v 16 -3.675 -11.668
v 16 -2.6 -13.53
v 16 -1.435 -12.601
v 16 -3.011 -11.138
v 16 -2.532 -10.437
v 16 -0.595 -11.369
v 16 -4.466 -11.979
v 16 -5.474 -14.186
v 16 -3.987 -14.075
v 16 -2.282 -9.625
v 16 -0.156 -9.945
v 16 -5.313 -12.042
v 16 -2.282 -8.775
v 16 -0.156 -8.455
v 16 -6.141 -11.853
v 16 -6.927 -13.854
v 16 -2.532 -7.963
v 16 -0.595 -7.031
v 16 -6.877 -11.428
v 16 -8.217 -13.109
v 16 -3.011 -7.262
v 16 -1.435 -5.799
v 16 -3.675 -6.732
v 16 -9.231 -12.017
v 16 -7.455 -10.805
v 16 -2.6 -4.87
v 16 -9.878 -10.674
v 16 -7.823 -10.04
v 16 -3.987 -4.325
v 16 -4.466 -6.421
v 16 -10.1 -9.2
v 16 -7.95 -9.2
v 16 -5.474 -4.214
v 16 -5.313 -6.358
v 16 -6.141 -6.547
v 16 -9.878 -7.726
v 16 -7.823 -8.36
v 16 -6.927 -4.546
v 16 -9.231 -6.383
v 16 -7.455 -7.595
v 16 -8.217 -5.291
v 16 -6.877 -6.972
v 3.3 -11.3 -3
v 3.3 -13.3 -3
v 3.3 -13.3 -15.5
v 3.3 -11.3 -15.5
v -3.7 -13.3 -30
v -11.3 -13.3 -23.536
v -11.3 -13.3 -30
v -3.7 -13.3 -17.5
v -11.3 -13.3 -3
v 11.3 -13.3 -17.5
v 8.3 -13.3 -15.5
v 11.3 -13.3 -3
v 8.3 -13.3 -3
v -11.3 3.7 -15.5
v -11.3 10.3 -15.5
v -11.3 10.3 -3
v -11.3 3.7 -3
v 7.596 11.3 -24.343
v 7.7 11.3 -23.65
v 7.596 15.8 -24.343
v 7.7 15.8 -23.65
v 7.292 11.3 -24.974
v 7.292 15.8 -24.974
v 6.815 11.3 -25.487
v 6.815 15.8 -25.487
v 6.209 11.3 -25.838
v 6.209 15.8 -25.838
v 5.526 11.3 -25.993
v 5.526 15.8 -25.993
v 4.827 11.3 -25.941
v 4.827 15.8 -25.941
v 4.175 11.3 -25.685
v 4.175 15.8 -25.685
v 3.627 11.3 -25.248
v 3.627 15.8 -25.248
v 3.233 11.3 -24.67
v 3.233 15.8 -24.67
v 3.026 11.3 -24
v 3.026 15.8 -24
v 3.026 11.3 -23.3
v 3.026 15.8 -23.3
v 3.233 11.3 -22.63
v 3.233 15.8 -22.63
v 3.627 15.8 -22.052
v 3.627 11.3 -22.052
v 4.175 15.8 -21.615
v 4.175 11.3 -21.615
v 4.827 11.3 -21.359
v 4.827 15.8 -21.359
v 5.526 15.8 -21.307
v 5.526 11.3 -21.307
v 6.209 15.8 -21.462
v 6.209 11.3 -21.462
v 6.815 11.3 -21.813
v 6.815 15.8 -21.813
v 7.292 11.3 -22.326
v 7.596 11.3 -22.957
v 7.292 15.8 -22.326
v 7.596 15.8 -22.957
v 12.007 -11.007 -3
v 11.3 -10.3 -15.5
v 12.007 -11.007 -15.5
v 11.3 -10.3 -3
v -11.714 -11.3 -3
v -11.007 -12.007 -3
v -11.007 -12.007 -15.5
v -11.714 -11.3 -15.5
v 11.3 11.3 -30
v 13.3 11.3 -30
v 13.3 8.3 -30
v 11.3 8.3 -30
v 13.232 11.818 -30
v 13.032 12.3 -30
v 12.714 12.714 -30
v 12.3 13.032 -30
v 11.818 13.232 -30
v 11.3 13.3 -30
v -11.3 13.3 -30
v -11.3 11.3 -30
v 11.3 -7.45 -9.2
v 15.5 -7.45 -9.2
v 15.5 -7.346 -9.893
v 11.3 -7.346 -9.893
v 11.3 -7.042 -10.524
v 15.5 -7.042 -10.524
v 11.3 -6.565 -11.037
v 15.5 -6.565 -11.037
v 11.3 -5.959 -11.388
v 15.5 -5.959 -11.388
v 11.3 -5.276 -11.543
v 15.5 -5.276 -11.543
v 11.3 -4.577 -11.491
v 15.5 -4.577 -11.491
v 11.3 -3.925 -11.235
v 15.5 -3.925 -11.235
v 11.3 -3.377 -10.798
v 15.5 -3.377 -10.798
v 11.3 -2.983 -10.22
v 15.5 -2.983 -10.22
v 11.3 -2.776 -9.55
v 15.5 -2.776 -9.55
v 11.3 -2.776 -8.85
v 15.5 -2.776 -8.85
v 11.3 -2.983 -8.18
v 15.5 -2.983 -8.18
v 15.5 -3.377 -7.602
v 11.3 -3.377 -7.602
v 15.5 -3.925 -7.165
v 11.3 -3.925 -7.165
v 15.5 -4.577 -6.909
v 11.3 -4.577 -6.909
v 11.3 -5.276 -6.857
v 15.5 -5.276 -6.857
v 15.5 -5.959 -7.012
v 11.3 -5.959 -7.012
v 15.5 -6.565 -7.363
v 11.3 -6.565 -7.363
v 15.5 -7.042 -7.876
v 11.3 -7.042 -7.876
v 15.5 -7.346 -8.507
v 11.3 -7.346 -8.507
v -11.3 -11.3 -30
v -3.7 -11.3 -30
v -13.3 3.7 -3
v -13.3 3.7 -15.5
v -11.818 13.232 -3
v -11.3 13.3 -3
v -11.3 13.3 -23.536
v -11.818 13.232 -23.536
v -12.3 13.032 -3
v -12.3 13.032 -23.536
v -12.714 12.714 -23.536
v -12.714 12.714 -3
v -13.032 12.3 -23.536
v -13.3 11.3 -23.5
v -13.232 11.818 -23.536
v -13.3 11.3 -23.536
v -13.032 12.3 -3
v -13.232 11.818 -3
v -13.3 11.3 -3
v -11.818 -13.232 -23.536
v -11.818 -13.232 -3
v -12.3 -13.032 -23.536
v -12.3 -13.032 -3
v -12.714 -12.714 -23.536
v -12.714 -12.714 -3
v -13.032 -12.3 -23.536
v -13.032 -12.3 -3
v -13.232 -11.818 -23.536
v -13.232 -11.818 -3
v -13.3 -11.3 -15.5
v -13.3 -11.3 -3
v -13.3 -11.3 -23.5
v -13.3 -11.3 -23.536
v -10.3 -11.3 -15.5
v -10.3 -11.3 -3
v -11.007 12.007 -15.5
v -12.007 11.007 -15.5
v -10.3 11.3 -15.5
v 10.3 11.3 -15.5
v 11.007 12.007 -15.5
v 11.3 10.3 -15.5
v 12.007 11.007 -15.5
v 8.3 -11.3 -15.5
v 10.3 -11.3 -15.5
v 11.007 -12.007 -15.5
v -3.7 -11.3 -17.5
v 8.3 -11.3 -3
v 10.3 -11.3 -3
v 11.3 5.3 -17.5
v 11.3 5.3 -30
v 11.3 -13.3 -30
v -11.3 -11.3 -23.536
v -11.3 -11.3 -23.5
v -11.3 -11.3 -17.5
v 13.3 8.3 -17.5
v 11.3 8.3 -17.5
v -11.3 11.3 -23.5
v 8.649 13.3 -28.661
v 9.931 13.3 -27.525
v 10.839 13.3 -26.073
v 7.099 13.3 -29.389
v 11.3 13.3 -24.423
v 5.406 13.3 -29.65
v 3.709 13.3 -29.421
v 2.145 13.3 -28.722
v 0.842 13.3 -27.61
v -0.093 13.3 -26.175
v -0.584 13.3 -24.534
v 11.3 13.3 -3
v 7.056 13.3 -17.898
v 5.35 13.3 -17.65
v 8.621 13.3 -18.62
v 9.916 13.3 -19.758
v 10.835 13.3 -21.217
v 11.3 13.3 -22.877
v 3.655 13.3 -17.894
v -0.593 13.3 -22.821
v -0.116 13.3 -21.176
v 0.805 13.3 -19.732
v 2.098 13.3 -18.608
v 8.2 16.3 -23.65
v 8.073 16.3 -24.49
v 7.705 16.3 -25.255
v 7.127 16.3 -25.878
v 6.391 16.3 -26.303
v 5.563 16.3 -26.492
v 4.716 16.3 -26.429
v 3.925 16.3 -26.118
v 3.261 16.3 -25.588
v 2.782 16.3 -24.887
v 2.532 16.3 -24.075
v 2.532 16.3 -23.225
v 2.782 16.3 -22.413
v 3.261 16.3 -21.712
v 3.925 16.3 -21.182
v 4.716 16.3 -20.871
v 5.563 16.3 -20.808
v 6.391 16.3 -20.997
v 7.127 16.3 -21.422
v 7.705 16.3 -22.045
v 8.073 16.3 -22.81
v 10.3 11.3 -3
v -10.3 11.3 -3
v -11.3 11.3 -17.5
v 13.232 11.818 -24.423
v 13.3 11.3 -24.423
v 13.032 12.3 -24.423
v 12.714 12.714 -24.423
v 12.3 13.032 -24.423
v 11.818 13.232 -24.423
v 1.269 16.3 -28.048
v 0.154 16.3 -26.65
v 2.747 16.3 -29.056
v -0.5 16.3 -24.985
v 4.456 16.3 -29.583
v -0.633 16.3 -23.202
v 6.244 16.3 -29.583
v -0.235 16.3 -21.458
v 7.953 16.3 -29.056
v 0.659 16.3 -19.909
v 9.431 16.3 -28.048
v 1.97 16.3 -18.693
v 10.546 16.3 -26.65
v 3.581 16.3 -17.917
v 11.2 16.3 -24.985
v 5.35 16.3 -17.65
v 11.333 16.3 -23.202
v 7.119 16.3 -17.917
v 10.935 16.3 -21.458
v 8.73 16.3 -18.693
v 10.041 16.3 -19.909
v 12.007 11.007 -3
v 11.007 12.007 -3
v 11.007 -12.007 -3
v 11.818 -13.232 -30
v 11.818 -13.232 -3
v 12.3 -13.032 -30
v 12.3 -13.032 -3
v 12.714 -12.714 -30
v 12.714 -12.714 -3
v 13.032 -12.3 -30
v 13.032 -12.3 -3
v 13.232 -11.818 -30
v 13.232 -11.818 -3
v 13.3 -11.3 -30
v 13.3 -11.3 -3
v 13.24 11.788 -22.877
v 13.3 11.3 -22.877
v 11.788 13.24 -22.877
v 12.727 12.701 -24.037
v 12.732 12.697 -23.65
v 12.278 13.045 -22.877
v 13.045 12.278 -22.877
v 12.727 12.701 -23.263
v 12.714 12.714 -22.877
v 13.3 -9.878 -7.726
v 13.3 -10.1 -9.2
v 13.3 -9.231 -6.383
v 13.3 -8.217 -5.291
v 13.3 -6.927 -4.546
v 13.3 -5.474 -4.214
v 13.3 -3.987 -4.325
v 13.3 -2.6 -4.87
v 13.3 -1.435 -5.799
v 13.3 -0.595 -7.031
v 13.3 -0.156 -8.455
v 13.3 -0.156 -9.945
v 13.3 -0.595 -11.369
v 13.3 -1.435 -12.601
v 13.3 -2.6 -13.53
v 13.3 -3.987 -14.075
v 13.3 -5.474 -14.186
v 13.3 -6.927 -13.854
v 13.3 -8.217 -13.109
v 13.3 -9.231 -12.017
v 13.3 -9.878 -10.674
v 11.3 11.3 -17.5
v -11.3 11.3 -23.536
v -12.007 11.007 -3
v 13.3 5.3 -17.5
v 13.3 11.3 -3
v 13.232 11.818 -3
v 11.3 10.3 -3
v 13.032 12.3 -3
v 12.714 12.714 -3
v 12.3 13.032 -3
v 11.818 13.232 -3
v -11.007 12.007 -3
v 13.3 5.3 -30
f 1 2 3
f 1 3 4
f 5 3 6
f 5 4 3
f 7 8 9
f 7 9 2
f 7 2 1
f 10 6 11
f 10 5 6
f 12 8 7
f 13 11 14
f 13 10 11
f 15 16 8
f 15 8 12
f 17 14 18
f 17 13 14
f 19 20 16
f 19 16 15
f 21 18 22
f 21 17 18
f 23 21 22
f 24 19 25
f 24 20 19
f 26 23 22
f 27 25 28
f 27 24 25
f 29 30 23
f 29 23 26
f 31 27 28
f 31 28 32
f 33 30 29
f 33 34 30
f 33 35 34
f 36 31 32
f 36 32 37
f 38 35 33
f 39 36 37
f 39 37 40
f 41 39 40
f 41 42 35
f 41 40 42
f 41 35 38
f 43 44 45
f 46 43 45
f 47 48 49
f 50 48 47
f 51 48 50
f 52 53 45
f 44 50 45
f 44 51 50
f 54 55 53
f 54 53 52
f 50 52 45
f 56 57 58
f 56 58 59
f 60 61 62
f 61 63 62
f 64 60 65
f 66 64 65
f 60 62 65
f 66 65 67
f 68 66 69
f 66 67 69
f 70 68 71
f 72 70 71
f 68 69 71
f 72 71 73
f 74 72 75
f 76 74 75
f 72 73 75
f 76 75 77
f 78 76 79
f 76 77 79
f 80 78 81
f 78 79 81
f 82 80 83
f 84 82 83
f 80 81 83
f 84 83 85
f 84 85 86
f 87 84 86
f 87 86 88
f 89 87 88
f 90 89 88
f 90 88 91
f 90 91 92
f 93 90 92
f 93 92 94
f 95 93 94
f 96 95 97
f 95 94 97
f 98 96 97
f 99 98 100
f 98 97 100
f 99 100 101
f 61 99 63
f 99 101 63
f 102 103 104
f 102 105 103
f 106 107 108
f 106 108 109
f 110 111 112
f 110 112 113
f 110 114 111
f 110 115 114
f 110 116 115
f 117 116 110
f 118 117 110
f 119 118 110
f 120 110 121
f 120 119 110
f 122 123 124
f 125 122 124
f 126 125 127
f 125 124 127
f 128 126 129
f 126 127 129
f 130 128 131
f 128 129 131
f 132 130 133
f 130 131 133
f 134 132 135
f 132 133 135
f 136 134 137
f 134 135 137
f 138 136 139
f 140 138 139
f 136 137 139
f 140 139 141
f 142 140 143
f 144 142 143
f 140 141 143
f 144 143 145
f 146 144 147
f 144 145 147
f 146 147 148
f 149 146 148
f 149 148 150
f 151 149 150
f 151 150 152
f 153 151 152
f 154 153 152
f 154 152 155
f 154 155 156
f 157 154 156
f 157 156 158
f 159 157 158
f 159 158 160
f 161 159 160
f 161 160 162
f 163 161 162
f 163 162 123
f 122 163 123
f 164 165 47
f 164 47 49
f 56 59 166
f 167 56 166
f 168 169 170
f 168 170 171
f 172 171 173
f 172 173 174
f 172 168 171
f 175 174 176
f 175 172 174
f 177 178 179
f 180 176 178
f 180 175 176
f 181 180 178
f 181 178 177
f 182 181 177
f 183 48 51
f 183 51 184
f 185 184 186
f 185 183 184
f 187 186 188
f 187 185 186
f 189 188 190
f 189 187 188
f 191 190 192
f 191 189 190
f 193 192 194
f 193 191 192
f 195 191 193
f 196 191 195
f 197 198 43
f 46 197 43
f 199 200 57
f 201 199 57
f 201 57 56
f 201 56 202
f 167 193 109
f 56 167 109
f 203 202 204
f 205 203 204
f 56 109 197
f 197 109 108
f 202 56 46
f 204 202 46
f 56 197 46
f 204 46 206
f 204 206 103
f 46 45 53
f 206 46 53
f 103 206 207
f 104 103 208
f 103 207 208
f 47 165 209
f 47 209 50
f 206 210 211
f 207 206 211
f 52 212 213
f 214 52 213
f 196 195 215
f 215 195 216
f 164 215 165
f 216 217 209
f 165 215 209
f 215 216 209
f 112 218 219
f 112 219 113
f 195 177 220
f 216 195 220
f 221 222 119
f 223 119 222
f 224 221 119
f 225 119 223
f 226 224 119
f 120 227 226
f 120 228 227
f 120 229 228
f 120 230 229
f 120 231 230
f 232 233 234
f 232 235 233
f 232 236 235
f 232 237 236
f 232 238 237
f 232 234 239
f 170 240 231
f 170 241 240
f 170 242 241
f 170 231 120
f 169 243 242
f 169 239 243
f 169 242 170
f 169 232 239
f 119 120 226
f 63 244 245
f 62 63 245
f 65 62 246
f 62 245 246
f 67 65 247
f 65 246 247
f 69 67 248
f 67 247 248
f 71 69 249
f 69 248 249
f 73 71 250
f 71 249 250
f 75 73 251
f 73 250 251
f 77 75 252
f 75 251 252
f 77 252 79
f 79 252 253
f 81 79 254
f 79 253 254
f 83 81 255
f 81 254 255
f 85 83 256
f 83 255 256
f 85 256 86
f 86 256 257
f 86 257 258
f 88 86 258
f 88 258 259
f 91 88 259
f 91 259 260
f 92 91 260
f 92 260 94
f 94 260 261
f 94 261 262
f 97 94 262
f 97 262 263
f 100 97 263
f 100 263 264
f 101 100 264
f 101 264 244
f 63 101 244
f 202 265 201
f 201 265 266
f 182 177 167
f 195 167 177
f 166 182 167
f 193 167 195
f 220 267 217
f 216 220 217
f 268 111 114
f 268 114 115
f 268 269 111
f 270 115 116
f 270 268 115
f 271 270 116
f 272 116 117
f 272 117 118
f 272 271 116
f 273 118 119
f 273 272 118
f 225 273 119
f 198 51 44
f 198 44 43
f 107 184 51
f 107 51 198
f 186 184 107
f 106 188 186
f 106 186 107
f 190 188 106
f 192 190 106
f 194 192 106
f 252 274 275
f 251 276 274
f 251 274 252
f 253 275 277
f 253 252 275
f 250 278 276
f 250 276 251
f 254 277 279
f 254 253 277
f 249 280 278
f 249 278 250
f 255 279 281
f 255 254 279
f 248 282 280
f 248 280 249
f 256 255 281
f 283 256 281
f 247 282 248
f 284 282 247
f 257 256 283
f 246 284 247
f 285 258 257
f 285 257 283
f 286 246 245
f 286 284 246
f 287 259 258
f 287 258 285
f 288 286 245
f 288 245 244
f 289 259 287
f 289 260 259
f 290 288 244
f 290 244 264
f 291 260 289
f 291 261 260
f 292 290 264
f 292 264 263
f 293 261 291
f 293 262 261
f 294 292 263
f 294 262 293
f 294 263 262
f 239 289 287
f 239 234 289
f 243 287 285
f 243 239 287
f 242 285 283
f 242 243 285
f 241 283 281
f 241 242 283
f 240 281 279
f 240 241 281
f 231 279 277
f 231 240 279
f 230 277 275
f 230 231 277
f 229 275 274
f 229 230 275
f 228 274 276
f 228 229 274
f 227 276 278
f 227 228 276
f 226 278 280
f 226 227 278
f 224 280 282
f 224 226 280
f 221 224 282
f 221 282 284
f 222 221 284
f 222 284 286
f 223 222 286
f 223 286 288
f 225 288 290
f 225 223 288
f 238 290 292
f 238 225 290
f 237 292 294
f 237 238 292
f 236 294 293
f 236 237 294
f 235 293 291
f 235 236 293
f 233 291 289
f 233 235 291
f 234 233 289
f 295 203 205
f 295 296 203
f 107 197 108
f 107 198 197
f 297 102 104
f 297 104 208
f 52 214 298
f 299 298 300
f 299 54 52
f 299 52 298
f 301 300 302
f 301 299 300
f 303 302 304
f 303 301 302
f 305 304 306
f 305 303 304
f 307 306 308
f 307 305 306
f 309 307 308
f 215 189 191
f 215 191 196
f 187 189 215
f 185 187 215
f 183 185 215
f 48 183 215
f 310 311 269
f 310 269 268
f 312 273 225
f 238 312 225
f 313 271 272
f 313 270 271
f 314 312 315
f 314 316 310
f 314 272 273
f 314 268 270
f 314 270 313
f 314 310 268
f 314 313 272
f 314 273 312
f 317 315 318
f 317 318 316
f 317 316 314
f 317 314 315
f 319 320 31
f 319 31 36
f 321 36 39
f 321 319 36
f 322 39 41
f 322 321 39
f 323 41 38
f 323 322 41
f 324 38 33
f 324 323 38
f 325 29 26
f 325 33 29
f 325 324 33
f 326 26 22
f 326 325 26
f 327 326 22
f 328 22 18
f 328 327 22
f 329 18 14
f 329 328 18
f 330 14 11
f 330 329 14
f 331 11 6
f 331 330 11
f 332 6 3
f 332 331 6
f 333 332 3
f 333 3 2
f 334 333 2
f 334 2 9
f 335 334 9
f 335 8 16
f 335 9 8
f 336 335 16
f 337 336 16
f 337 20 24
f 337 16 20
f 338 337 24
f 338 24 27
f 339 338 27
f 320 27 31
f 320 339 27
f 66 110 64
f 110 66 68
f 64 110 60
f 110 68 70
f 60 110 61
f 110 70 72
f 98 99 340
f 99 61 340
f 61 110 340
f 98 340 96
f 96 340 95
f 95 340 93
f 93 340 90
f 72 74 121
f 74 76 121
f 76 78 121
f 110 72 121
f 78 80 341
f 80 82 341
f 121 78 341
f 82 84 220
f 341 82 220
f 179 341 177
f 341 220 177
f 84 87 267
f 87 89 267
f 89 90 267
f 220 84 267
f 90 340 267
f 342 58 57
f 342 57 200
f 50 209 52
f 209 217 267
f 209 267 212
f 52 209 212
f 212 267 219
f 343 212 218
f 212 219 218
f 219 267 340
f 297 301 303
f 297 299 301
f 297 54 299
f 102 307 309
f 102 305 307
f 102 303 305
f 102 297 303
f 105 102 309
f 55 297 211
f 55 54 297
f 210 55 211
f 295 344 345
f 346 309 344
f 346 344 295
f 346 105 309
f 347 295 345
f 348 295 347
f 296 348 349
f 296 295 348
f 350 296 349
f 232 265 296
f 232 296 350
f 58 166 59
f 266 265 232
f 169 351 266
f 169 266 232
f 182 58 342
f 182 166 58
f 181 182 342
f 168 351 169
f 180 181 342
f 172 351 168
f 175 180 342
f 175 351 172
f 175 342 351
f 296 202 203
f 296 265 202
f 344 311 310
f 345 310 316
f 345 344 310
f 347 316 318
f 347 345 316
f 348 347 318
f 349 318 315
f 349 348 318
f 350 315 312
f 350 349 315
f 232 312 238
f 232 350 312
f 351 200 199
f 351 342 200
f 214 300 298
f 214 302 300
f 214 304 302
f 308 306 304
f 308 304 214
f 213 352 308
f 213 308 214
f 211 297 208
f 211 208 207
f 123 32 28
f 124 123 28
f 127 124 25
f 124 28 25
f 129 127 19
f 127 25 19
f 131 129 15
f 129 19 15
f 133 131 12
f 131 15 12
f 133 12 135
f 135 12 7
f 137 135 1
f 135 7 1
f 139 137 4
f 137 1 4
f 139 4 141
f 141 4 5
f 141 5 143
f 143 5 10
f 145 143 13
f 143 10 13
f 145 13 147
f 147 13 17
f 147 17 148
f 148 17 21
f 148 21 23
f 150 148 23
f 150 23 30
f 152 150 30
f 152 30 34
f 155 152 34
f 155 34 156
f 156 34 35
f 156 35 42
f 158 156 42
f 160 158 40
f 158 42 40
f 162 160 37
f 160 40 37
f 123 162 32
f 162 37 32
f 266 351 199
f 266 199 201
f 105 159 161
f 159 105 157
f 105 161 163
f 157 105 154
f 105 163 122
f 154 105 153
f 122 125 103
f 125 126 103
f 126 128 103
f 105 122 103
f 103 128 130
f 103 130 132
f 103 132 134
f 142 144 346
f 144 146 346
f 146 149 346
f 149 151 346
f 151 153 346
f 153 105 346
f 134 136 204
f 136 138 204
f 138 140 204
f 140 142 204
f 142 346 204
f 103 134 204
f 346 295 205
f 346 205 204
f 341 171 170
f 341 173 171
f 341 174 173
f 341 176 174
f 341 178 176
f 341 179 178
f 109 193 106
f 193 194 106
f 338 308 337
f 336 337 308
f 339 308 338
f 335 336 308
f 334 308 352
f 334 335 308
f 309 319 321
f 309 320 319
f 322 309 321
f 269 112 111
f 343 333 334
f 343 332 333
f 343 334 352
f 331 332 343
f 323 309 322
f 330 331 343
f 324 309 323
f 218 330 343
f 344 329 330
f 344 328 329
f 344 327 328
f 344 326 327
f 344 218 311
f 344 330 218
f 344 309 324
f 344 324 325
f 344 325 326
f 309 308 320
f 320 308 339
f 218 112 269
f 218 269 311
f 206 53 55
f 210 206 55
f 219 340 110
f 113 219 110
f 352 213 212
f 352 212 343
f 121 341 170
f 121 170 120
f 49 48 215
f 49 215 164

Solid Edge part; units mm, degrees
sketch "Sketch1" plane through (0, 0, 0) normal (0, 0, 1) x (1, 0, 0)
  line L0 (-11.3, -11.3) -> (11.3, -11.3)
  line L1 (11.3, -11.3) -> (11.3, 11.3)
  line L2 (11.3, 11.3) -> (-11.3, 11.3)
  line L3 (-11.3, 11.3) -> (-11.3, -11.3)
  dimension "D1" = 22.6
  dimension "D2" = 22.6
extrude "Protrusion1" add sketch "Sketch1" against normal blind 3
sketch "Sketch2" plane through (0, 0, 0) normal (0, 0, 1) x (1, 0, 0)
  line L0 (-13.3, -13.3) -> (13.3, -13.3)
  line L1 (13.3, -13.3) -> (13.3, 13.3)
  line L2 (13.3, 13.3) -> (-13.3, 13.3)
  line L3 (-13.3, 13.3) -> (-13.3, -13.3)
  line L4 (-11.3, -11.3) -> (11.3, -11.3)
  line L5 (11.3, -11.3) -> (11.3, 11.3)
  line L6 (11.3, 11.3) -> (-11.3, 11.3)
  line L7 (-11.3, 11.3) -> (-11.3, -11.3)
  dimension "D1" = 2
  dimension "D2" = 2
  dimension "D3" = 2
  dimension "D4" = 2
extrude "Extrusionsausprägung_2" add sketch "Sketch2" against normal blind 31
sketch "Sketch3" plane through (13.3, 3, -15.5) normal (1, 0, 0) x (0, -1, 0)
  circle A0 centre (8.1, -6.3) radius 5
  dimension "D1" = 10
  dimension "D2" = 8.2
  dimension "D3" = 9.2
extrude "Protrusion2" add sketch "Sketch3" along normal blind 2.7
sketch "Sketch4" plane through (16, 5.1, -9.2) normal (1, 0, 0) x (0, -1, 0)
  circle A0 centre (10.2, 0) radius 2.35
  dimension "D1" = 4.7
extrude "Cutout1" cut sketch "Sketch4" against normal through all
sketch "Sketch5" plane through (0, -11.3, -14) normal (0, 1, 0) x (1, 0, 0)
  line L0 (11.3, 17) -> (-3.7, 17)
  line L1 (-3.7, 3) -> (-3.7, 17)
  line L2 (-3.7, 3) -> (11.3, 3)
  line L3 (11.3, 3) -> (11.3, 17)
  dimension "D1" = 14
  dimension "D2" = 15
extrude "Cutout2" cut sketch "Sketch5" against normal through all
sketch "Sketch6" plane through (13.3, 3, -15.5) normal (1, 0, 0) x (0, -1, 0)
  line L0 (-2.3, 15.5) -> (-2.3, 2)
  line L1 (-2.3, 2) -> (-5.3, 2)
  line L2 (-5.3, 2) -> (-5.3, 15.5)
  line L3 (-5.3, 15.5) -> (-2.3, 15.5)
  dimension "D1" = 13.5
  dimension "D2" = 5
extrude "Cutout3" cut sketch "Sketch6" against normal up to next
sketch "Sketch7" plane through (-4.5, 12.3, -18.5) normal (0, 0, -1) x (-1, 0, 0)
  line L0 (8.8, 1) -> (-17.8, 1)
  line L1 (-17.8, 1) -> (-17.8, -25.6)
  line L2 (-17.8, -25.6) -> (8.8, -25.6)
  line L3 (8.8, -25.6) -> (8.8, 1)
extrude "Extrusionsausprägung_5" add sketch "Sketch7" against normal blind 3
sketch "Sketch8" plane through (-13.3, 0, -15.5) normal (-1, 0, 0) x (0, 1, 0)
  line L0 (13.3, -15.5) -> (-13.3, -15.5)
  line L1 (-13.3, -15.5) -> (-13.3, -12.5)
  line L2 (-13.3, -12.5) -> (13.3, -12.5)
  line L3 (13.3, -12.5) -> (13.3, -15.5)
  dimension "D1" = 3
extrude "Cutout4" cut sketch "Sketch8" against normal through all
sketch "Sketch9" plane through (0, 0, -3) normal (0, 0, 1) x (0, -1, 0)
  line L0 (11.3, -13.3) -> (11.3, -11.3)
  line L1 (11.3, -11.3) -> (-3.7, -11.3)
  line L2 (-3.7, -11.3) -> (-3.7, -13.3)
  line L3 (-3.7, -13.3) -> (11.3, -13.3)
  dimension "D1" = 15
  dimension "D2" = 2
extrude "Cutout5" cut sketch "Sketch9" against normal up to vertex (12.5 mm away)
sketch "Sketch10" plane through (0, 13.3, -17) normal (0, 1, 0) x (0, 0, 1)
  circle A0 centre (-6.65, 5.35) radius 6
  dimension "D1" = 7.35
  dimension "D2" = 7.95
  dimension "D3" = 12
extrude "Extrusionsausprägung_6" add sketch "Sketch10" along normal blind 3
sketch "Sketch11" plane through (4.9, 16.3, -24.7) normal (0, 1, 0) x (1, 0, 0)
  circle A0 centre (0.45, -1.05) radius 2.35
extrude "Cutout6" cut sketch "Sketch11" against normal up to next
sketch "Sketch12" plane through (0, 13.3, -18) normal (0, 1, 0) x (1, 0, 0)
  line L0 (-11.3, 13) -> (-13.3, 5.5359)
  line L1 (-13.3, 13) -> (-13.3, 5.5359)
  line L2 (-11.3, 13) -> (-13.3, 13)
  dimension "D1" = 2
extrude "Cutout7" cut sketch "Sketch12" against normal up to next
sketch "Sketch13" plane through (0.3352, -13.3, -18) normal (0, -1, 0) x (1, 0, 0)
  line L0 (2.9648, 2.5) -> (7.9648, 2.5)
  line L1 (7.9648, 2.5) -> (7.9648, 15)
  line L2 (7.9648, 15) -> (2.9648, 15)
  line L3 (2.9648, 15) -> (2.9648, 2.5)
  dimension "D1" = 5
  dimension "D2" = 3
extrude "Cutout8" cut sketch "Sketch13" against normal up to next
sketch "Sketch14" plane through (-12.3, 7.5, -3) normal (0, 0, 1) x (0, 1, 0)
  line L0 (2.8, -1) -> (3.5071, -0.2929)
  line L1 (3.5071, -0.2929) -> (4.5071, -1.2929)
  line L2 (4.5071, -1.2929) -> (3.8, -2)
  line L3 (3.8, -2) -> (3.8, -1)
  line L4 (3.8, -1) -> (2.8, -1)
  dimension "D1" = 1
  dimension "D2" = 1
extrude "Cutout9" cut sketch "Sketch14" against normal up to vertex (12.5 mm away)
mirror "Mirror1" about plane through (0, 0, 0) normal (1, 0, 0) of "Cutout9"
mirror "Mirror2" about plane through (0, 0, 0) normal (0, -1, 0) of "Cutout9", "Mirror1"
sketch "Sketch15" plane through (0, 12.3, -31) normal (0, 0, -1) x (-1, 0, 0)
  line L0 (11.3, -1) -> (13.3, -1)
  line L1 (13.3, -1) -> (13.3, -23.6)
  line L2 (13.3, -23.6) -> (11.3, -23.6)
  line L3 (11.3, -23.6) -> (11.3, -1)
  dimension "D1" = 2
extrude "Cutout10" cut sketch "Sketch15" against normal blind 7.5
chamfer "Fase_5" distance 0.5 angle 45 2 edges at (3, 16.3, -23.65) (16, -2.75, -9.2)
fillet "Verrundung_6" radius 2 4 edges at (13.3, 13.3, -17) (13.3, -13.3, -17) (-13.3, 13.3, -13.2679) (-13.3, -13.3, -13.2679)
sketch "Sketch16" plane through (0, -13.3, -17) normal (0, -1, 0) x (1, 0, 0)
  line L0 (-13.3, -6.5359) -> (-11.3, -6.5359)
  line L1 (-11.3, -6.5359) -> (-11.3, -14)
  line L2 (-11.3, -14) -> (-13.3, -6.5359)
extrude "Cutout11" cut sketch "Sketch16" against normal through all
sketch "Sketch17" plane through (12.3, -4, -31) normal (0, 0, -1) x (0, 1, 0)
  line L0 (-9.3, -1) -> (9.3, -1)
  line L1 (9.3, -1) -> (9.3, 1)
  line L2 (9.3, 1) -> (12.3, 1)
  line L3 (12.3, 1) -> (12.3, -1)
  line L4 (12.3, -1) -> (15.3, -1)
  line L5 (15.3, -1) -> (15.3, -23.6)
  line L6 (15.3, -23.6) -> (-7.3, -23.6)
  line L7 (-7.3, -23.6) -> (-7.3, -16)
  line L8 (-7.3, -16) -> (-9.3, -16)
  line L9 (-9.3, -16) -> (-9.3, -1)
extrude "Extrusionsausschnitt_21" cut sketch "Sketch17" against normal blind 13.5
sketch "Sketch18" plane through (12.3, -4, -31) normal (0, 0, -1) x (0, 1, 0)
  line L0 (-24.7024, -32.1956) -> (31.7056, -32.1956)
  line L1 (31.7056, -32.1956) -> (31.7056, 6.9175)
  line L2 (31.7056, 6.9175) -> (-24.7024, 6.9175)
  line L3 (-24.7024, 6.9175) -> (-24.7024, -32.1956)
extrude "Extrusionsausschnitt_22" cut sketch "Sketch18" against normal blind 1
properties material "Nylon, allgemein"
